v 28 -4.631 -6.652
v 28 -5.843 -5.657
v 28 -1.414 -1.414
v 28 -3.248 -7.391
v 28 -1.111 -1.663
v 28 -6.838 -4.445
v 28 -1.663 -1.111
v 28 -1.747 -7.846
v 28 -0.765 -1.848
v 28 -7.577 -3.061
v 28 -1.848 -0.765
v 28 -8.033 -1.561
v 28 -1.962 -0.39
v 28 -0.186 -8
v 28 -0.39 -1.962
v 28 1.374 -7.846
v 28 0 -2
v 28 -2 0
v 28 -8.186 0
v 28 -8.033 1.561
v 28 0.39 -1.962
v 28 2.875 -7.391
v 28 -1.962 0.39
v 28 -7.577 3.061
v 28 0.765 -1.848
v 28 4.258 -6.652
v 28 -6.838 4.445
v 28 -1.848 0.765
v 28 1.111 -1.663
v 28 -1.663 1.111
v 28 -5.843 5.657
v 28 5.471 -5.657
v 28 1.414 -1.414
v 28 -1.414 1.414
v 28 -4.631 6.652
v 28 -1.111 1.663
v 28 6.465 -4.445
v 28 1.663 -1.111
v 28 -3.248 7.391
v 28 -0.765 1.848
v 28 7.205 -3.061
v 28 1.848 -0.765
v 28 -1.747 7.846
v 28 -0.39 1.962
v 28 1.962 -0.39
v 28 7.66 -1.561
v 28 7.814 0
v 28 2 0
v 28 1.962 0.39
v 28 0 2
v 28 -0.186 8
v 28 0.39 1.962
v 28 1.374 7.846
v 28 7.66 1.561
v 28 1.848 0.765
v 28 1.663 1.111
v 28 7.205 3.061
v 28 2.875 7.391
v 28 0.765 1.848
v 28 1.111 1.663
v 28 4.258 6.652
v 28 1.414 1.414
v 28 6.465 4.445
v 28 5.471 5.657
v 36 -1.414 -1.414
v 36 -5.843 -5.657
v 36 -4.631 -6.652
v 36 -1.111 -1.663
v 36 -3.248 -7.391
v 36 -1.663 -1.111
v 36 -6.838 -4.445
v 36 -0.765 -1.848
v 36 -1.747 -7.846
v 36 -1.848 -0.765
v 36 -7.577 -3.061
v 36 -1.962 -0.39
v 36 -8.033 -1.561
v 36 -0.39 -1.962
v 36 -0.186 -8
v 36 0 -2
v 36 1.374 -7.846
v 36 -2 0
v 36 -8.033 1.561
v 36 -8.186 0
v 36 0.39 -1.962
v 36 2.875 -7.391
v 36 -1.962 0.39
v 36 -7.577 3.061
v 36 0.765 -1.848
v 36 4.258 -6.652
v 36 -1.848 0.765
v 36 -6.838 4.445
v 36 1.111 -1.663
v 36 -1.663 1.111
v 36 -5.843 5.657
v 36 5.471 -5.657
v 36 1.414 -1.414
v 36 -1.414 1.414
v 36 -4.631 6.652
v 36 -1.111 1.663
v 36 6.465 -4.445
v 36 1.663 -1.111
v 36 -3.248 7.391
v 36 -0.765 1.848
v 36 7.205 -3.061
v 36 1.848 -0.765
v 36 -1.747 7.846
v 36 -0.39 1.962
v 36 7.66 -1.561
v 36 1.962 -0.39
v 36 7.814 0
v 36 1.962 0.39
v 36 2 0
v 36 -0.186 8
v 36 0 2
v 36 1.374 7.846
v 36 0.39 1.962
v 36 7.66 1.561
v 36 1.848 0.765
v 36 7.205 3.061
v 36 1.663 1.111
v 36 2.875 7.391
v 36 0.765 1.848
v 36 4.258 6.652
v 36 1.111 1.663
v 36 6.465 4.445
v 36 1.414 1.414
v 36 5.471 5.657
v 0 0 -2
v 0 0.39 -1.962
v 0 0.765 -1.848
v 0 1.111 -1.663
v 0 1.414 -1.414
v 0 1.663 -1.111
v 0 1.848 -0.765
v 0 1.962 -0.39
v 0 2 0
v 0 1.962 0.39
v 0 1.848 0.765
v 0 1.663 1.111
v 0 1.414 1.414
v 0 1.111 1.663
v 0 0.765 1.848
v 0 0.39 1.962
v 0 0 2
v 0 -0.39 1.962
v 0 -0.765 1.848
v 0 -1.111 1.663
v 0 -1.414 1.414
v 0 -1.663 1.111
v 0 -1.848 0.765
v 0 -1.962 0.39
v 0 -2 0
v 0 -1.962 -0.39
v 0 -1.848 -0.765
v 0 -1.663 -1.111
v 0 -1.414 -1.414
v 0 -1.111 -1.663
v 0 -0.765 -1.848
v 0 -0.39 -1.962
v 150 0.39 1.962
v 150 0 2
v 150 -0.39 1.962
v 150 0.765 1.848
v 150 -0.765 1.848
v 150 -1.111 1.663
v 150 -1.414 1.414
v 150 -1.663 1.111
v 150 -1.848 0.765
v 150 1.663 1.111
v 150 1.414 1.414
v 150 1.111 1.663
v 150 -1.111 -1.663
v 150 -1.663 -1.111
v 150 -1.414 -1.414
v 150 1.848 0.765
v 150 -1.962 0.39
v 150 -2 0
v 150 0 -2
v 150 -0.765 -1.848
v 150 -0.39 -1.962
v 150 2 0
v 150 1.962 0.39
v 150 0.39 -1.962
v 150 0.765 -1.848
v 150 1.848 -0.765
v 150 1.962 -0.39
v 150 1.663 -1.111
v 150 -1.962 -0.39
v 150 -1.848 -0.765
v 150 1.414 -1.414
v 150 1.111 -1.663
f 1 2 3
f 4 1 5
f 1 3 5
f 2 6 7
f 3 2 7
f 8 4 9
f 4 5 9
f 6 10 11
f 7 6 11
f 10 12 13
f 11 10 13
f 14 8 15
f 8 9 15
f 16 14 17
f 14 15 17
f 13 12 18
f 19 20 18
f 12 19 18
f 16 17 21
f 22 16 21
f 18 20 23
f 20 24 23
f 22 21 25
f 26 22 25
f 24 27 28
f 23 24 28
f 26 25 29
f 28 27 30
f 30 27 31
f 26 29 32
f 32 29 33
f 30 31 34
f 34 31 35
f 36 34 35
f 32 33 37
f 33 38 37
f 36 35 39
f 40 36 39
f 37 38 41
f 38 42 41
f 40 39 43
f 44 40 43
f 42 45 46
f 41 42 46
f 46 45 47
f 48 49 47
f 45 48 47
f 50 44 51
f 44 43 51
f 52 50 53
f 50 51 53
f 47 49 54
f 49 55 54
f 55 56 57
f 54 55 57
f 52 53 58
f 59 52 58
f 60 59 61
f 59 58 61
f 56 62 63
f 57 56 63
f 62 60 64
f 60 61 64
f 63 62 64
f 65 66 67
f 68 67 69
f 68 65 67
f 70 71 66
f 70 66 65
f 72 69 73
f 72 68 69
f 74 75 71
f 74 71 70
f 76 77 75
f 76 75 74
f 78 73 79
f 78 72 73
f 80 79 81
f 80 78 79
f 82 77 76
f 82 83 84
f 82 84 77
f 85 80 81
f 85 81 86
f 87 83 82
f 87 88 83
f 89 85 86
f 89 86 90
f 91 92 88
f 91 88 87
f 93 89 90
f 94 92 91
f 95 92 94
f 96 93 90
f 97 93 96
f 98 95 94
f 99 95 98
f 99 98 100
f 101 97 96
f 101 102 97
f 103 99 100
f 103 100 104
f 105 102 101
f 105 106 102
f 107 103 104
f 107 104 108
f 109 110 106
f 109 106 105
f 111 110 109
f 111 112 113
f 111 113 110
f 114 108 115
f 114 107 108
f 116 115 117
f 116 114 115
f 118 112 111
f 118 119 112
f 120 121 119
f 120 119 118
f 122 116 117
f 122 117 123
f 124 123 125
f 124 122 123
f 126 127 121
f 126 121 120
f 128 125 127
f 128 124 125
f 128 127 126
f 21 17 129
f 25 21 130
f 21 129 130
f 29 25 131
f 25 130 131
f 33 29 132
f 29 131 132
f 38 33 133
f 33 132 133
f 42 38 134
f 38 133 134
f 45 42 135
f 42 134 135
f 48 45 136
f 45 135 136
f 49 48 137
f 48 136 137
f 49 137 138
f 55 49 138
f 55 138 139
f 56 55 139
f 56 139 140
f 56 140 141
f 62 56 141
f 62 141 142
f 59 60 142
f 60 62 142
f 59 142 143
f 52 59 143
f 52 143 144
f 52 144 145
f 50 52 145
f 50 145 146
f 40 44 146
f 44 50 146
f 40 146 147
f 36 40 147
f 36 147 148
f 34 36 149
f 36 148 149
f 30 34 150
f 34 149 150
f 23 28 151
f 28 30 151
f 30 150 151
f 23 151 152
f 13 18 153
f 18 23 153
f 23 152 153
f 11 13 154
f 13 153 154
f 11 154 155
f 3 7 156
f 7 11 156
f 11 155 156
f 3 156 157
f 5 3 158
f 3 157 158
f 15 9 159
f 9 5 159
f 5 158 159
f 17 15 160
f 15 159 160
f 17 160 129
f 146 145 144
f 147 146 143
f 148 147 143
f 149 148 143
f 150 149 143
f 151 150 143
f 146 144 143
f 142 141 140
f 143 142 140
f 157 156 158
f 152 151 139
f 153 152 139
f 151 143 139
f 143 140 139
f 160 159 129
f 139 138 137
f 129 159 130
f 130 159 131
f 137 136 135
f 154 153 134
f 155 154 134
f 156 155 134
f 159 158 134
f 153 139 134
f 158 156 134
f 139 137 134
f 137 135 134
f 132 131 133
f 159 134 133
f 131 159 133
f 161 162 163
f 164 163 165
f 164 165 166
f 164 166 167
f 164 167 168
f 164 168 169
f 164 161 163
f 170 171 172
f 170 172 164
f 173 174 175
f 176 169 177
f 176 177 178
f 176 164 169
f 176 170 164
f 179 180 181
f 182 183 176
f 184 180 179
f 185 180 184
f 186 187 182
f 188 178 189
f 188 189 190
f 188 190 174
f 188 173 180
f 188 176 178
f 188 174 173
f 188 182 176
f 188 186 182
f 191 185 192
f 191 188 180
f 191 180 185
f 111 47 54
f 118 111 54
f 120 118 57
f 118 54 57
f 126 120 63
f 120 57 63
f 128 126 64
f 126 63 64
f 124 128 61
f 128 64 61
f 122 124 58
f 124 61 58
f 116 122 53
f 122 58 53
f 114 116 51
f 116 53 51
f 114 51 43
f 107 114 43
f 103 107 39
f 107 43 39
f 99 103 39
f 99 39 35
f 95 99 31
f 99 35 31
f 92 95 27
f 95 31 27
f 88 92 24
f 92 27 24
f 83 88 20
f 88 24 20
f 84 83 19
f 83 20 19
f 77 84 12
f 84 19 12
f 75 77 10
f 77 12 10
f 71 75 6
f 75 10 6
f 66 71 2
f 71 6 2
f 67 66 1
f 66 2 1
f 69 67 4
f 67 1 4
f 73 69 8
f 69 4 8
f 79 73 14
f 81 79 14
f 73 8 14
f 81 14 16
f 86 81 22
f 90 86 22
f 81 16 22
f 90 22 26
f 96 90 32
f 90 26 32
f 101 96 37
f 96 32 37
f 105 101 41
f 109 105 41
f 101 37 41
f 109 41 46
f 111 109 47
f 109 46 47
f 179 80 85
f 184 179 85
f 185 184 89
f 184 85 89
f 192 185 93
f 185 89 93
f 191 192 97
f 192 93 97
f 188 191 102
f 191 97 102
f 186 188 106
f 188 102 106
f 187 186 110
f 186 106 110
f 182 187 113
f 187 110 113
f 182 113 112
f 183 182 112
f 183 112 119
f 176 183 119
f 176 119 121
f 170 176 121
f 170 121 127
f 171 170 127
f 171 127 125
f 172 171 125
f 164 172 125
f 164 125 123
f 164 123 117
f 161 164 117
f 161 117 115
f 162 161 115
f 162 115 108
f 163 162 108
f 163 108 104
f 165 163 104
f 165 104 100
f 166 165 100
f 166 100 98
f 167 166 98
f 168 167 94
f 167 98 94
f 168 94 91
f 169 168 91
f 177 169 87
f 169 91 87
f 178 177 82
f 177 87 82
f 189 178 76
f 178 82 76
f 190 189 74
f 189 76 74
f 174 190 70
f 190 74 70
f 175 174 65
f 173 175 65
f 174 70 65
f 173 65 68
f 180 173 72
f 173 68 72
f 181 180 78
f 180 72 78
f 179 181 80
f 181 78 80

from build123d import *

# Parameters (mm, degrees)
SKETCH1_R               = 2
BOSS_EXTRUDE1_DEPTH     = 150
BOSS_EXTRUDE2_START     = 28
BOSS_EXTRUDE2_OUTLINE_R = 8
BOSS_EXTRUDE2_DEPTH     = 8


# Read off the part's stored shape, not the designer's step: Boss-Extrude2
with BuildPart() as part:
    # Sketch1 → Boss-Extrude1 (new body)
    with BuildSketch(Plane(origin=(0, 0, 0), x_dir=(0, 0, -1), z_dir=(1, 0, 0))):
        Circle(SKETCH1_R)
    extrude(amount=BOSS_EXTRUDE1_DEPTH)

    # Boss-Extrude2 outline → Boss-Extrude2 (add)
    with BuildSketch(Plane.YZ.offset(BOSS_EXTRUDE2_START)):
        with Locations((-0.186353815, 0)):
            Circle(BOSS_EXTRUDE2_OUTLINE_R)
    extrude(amount=BOSS_EXTRUDE2_DEPTH)


solid = part.part
